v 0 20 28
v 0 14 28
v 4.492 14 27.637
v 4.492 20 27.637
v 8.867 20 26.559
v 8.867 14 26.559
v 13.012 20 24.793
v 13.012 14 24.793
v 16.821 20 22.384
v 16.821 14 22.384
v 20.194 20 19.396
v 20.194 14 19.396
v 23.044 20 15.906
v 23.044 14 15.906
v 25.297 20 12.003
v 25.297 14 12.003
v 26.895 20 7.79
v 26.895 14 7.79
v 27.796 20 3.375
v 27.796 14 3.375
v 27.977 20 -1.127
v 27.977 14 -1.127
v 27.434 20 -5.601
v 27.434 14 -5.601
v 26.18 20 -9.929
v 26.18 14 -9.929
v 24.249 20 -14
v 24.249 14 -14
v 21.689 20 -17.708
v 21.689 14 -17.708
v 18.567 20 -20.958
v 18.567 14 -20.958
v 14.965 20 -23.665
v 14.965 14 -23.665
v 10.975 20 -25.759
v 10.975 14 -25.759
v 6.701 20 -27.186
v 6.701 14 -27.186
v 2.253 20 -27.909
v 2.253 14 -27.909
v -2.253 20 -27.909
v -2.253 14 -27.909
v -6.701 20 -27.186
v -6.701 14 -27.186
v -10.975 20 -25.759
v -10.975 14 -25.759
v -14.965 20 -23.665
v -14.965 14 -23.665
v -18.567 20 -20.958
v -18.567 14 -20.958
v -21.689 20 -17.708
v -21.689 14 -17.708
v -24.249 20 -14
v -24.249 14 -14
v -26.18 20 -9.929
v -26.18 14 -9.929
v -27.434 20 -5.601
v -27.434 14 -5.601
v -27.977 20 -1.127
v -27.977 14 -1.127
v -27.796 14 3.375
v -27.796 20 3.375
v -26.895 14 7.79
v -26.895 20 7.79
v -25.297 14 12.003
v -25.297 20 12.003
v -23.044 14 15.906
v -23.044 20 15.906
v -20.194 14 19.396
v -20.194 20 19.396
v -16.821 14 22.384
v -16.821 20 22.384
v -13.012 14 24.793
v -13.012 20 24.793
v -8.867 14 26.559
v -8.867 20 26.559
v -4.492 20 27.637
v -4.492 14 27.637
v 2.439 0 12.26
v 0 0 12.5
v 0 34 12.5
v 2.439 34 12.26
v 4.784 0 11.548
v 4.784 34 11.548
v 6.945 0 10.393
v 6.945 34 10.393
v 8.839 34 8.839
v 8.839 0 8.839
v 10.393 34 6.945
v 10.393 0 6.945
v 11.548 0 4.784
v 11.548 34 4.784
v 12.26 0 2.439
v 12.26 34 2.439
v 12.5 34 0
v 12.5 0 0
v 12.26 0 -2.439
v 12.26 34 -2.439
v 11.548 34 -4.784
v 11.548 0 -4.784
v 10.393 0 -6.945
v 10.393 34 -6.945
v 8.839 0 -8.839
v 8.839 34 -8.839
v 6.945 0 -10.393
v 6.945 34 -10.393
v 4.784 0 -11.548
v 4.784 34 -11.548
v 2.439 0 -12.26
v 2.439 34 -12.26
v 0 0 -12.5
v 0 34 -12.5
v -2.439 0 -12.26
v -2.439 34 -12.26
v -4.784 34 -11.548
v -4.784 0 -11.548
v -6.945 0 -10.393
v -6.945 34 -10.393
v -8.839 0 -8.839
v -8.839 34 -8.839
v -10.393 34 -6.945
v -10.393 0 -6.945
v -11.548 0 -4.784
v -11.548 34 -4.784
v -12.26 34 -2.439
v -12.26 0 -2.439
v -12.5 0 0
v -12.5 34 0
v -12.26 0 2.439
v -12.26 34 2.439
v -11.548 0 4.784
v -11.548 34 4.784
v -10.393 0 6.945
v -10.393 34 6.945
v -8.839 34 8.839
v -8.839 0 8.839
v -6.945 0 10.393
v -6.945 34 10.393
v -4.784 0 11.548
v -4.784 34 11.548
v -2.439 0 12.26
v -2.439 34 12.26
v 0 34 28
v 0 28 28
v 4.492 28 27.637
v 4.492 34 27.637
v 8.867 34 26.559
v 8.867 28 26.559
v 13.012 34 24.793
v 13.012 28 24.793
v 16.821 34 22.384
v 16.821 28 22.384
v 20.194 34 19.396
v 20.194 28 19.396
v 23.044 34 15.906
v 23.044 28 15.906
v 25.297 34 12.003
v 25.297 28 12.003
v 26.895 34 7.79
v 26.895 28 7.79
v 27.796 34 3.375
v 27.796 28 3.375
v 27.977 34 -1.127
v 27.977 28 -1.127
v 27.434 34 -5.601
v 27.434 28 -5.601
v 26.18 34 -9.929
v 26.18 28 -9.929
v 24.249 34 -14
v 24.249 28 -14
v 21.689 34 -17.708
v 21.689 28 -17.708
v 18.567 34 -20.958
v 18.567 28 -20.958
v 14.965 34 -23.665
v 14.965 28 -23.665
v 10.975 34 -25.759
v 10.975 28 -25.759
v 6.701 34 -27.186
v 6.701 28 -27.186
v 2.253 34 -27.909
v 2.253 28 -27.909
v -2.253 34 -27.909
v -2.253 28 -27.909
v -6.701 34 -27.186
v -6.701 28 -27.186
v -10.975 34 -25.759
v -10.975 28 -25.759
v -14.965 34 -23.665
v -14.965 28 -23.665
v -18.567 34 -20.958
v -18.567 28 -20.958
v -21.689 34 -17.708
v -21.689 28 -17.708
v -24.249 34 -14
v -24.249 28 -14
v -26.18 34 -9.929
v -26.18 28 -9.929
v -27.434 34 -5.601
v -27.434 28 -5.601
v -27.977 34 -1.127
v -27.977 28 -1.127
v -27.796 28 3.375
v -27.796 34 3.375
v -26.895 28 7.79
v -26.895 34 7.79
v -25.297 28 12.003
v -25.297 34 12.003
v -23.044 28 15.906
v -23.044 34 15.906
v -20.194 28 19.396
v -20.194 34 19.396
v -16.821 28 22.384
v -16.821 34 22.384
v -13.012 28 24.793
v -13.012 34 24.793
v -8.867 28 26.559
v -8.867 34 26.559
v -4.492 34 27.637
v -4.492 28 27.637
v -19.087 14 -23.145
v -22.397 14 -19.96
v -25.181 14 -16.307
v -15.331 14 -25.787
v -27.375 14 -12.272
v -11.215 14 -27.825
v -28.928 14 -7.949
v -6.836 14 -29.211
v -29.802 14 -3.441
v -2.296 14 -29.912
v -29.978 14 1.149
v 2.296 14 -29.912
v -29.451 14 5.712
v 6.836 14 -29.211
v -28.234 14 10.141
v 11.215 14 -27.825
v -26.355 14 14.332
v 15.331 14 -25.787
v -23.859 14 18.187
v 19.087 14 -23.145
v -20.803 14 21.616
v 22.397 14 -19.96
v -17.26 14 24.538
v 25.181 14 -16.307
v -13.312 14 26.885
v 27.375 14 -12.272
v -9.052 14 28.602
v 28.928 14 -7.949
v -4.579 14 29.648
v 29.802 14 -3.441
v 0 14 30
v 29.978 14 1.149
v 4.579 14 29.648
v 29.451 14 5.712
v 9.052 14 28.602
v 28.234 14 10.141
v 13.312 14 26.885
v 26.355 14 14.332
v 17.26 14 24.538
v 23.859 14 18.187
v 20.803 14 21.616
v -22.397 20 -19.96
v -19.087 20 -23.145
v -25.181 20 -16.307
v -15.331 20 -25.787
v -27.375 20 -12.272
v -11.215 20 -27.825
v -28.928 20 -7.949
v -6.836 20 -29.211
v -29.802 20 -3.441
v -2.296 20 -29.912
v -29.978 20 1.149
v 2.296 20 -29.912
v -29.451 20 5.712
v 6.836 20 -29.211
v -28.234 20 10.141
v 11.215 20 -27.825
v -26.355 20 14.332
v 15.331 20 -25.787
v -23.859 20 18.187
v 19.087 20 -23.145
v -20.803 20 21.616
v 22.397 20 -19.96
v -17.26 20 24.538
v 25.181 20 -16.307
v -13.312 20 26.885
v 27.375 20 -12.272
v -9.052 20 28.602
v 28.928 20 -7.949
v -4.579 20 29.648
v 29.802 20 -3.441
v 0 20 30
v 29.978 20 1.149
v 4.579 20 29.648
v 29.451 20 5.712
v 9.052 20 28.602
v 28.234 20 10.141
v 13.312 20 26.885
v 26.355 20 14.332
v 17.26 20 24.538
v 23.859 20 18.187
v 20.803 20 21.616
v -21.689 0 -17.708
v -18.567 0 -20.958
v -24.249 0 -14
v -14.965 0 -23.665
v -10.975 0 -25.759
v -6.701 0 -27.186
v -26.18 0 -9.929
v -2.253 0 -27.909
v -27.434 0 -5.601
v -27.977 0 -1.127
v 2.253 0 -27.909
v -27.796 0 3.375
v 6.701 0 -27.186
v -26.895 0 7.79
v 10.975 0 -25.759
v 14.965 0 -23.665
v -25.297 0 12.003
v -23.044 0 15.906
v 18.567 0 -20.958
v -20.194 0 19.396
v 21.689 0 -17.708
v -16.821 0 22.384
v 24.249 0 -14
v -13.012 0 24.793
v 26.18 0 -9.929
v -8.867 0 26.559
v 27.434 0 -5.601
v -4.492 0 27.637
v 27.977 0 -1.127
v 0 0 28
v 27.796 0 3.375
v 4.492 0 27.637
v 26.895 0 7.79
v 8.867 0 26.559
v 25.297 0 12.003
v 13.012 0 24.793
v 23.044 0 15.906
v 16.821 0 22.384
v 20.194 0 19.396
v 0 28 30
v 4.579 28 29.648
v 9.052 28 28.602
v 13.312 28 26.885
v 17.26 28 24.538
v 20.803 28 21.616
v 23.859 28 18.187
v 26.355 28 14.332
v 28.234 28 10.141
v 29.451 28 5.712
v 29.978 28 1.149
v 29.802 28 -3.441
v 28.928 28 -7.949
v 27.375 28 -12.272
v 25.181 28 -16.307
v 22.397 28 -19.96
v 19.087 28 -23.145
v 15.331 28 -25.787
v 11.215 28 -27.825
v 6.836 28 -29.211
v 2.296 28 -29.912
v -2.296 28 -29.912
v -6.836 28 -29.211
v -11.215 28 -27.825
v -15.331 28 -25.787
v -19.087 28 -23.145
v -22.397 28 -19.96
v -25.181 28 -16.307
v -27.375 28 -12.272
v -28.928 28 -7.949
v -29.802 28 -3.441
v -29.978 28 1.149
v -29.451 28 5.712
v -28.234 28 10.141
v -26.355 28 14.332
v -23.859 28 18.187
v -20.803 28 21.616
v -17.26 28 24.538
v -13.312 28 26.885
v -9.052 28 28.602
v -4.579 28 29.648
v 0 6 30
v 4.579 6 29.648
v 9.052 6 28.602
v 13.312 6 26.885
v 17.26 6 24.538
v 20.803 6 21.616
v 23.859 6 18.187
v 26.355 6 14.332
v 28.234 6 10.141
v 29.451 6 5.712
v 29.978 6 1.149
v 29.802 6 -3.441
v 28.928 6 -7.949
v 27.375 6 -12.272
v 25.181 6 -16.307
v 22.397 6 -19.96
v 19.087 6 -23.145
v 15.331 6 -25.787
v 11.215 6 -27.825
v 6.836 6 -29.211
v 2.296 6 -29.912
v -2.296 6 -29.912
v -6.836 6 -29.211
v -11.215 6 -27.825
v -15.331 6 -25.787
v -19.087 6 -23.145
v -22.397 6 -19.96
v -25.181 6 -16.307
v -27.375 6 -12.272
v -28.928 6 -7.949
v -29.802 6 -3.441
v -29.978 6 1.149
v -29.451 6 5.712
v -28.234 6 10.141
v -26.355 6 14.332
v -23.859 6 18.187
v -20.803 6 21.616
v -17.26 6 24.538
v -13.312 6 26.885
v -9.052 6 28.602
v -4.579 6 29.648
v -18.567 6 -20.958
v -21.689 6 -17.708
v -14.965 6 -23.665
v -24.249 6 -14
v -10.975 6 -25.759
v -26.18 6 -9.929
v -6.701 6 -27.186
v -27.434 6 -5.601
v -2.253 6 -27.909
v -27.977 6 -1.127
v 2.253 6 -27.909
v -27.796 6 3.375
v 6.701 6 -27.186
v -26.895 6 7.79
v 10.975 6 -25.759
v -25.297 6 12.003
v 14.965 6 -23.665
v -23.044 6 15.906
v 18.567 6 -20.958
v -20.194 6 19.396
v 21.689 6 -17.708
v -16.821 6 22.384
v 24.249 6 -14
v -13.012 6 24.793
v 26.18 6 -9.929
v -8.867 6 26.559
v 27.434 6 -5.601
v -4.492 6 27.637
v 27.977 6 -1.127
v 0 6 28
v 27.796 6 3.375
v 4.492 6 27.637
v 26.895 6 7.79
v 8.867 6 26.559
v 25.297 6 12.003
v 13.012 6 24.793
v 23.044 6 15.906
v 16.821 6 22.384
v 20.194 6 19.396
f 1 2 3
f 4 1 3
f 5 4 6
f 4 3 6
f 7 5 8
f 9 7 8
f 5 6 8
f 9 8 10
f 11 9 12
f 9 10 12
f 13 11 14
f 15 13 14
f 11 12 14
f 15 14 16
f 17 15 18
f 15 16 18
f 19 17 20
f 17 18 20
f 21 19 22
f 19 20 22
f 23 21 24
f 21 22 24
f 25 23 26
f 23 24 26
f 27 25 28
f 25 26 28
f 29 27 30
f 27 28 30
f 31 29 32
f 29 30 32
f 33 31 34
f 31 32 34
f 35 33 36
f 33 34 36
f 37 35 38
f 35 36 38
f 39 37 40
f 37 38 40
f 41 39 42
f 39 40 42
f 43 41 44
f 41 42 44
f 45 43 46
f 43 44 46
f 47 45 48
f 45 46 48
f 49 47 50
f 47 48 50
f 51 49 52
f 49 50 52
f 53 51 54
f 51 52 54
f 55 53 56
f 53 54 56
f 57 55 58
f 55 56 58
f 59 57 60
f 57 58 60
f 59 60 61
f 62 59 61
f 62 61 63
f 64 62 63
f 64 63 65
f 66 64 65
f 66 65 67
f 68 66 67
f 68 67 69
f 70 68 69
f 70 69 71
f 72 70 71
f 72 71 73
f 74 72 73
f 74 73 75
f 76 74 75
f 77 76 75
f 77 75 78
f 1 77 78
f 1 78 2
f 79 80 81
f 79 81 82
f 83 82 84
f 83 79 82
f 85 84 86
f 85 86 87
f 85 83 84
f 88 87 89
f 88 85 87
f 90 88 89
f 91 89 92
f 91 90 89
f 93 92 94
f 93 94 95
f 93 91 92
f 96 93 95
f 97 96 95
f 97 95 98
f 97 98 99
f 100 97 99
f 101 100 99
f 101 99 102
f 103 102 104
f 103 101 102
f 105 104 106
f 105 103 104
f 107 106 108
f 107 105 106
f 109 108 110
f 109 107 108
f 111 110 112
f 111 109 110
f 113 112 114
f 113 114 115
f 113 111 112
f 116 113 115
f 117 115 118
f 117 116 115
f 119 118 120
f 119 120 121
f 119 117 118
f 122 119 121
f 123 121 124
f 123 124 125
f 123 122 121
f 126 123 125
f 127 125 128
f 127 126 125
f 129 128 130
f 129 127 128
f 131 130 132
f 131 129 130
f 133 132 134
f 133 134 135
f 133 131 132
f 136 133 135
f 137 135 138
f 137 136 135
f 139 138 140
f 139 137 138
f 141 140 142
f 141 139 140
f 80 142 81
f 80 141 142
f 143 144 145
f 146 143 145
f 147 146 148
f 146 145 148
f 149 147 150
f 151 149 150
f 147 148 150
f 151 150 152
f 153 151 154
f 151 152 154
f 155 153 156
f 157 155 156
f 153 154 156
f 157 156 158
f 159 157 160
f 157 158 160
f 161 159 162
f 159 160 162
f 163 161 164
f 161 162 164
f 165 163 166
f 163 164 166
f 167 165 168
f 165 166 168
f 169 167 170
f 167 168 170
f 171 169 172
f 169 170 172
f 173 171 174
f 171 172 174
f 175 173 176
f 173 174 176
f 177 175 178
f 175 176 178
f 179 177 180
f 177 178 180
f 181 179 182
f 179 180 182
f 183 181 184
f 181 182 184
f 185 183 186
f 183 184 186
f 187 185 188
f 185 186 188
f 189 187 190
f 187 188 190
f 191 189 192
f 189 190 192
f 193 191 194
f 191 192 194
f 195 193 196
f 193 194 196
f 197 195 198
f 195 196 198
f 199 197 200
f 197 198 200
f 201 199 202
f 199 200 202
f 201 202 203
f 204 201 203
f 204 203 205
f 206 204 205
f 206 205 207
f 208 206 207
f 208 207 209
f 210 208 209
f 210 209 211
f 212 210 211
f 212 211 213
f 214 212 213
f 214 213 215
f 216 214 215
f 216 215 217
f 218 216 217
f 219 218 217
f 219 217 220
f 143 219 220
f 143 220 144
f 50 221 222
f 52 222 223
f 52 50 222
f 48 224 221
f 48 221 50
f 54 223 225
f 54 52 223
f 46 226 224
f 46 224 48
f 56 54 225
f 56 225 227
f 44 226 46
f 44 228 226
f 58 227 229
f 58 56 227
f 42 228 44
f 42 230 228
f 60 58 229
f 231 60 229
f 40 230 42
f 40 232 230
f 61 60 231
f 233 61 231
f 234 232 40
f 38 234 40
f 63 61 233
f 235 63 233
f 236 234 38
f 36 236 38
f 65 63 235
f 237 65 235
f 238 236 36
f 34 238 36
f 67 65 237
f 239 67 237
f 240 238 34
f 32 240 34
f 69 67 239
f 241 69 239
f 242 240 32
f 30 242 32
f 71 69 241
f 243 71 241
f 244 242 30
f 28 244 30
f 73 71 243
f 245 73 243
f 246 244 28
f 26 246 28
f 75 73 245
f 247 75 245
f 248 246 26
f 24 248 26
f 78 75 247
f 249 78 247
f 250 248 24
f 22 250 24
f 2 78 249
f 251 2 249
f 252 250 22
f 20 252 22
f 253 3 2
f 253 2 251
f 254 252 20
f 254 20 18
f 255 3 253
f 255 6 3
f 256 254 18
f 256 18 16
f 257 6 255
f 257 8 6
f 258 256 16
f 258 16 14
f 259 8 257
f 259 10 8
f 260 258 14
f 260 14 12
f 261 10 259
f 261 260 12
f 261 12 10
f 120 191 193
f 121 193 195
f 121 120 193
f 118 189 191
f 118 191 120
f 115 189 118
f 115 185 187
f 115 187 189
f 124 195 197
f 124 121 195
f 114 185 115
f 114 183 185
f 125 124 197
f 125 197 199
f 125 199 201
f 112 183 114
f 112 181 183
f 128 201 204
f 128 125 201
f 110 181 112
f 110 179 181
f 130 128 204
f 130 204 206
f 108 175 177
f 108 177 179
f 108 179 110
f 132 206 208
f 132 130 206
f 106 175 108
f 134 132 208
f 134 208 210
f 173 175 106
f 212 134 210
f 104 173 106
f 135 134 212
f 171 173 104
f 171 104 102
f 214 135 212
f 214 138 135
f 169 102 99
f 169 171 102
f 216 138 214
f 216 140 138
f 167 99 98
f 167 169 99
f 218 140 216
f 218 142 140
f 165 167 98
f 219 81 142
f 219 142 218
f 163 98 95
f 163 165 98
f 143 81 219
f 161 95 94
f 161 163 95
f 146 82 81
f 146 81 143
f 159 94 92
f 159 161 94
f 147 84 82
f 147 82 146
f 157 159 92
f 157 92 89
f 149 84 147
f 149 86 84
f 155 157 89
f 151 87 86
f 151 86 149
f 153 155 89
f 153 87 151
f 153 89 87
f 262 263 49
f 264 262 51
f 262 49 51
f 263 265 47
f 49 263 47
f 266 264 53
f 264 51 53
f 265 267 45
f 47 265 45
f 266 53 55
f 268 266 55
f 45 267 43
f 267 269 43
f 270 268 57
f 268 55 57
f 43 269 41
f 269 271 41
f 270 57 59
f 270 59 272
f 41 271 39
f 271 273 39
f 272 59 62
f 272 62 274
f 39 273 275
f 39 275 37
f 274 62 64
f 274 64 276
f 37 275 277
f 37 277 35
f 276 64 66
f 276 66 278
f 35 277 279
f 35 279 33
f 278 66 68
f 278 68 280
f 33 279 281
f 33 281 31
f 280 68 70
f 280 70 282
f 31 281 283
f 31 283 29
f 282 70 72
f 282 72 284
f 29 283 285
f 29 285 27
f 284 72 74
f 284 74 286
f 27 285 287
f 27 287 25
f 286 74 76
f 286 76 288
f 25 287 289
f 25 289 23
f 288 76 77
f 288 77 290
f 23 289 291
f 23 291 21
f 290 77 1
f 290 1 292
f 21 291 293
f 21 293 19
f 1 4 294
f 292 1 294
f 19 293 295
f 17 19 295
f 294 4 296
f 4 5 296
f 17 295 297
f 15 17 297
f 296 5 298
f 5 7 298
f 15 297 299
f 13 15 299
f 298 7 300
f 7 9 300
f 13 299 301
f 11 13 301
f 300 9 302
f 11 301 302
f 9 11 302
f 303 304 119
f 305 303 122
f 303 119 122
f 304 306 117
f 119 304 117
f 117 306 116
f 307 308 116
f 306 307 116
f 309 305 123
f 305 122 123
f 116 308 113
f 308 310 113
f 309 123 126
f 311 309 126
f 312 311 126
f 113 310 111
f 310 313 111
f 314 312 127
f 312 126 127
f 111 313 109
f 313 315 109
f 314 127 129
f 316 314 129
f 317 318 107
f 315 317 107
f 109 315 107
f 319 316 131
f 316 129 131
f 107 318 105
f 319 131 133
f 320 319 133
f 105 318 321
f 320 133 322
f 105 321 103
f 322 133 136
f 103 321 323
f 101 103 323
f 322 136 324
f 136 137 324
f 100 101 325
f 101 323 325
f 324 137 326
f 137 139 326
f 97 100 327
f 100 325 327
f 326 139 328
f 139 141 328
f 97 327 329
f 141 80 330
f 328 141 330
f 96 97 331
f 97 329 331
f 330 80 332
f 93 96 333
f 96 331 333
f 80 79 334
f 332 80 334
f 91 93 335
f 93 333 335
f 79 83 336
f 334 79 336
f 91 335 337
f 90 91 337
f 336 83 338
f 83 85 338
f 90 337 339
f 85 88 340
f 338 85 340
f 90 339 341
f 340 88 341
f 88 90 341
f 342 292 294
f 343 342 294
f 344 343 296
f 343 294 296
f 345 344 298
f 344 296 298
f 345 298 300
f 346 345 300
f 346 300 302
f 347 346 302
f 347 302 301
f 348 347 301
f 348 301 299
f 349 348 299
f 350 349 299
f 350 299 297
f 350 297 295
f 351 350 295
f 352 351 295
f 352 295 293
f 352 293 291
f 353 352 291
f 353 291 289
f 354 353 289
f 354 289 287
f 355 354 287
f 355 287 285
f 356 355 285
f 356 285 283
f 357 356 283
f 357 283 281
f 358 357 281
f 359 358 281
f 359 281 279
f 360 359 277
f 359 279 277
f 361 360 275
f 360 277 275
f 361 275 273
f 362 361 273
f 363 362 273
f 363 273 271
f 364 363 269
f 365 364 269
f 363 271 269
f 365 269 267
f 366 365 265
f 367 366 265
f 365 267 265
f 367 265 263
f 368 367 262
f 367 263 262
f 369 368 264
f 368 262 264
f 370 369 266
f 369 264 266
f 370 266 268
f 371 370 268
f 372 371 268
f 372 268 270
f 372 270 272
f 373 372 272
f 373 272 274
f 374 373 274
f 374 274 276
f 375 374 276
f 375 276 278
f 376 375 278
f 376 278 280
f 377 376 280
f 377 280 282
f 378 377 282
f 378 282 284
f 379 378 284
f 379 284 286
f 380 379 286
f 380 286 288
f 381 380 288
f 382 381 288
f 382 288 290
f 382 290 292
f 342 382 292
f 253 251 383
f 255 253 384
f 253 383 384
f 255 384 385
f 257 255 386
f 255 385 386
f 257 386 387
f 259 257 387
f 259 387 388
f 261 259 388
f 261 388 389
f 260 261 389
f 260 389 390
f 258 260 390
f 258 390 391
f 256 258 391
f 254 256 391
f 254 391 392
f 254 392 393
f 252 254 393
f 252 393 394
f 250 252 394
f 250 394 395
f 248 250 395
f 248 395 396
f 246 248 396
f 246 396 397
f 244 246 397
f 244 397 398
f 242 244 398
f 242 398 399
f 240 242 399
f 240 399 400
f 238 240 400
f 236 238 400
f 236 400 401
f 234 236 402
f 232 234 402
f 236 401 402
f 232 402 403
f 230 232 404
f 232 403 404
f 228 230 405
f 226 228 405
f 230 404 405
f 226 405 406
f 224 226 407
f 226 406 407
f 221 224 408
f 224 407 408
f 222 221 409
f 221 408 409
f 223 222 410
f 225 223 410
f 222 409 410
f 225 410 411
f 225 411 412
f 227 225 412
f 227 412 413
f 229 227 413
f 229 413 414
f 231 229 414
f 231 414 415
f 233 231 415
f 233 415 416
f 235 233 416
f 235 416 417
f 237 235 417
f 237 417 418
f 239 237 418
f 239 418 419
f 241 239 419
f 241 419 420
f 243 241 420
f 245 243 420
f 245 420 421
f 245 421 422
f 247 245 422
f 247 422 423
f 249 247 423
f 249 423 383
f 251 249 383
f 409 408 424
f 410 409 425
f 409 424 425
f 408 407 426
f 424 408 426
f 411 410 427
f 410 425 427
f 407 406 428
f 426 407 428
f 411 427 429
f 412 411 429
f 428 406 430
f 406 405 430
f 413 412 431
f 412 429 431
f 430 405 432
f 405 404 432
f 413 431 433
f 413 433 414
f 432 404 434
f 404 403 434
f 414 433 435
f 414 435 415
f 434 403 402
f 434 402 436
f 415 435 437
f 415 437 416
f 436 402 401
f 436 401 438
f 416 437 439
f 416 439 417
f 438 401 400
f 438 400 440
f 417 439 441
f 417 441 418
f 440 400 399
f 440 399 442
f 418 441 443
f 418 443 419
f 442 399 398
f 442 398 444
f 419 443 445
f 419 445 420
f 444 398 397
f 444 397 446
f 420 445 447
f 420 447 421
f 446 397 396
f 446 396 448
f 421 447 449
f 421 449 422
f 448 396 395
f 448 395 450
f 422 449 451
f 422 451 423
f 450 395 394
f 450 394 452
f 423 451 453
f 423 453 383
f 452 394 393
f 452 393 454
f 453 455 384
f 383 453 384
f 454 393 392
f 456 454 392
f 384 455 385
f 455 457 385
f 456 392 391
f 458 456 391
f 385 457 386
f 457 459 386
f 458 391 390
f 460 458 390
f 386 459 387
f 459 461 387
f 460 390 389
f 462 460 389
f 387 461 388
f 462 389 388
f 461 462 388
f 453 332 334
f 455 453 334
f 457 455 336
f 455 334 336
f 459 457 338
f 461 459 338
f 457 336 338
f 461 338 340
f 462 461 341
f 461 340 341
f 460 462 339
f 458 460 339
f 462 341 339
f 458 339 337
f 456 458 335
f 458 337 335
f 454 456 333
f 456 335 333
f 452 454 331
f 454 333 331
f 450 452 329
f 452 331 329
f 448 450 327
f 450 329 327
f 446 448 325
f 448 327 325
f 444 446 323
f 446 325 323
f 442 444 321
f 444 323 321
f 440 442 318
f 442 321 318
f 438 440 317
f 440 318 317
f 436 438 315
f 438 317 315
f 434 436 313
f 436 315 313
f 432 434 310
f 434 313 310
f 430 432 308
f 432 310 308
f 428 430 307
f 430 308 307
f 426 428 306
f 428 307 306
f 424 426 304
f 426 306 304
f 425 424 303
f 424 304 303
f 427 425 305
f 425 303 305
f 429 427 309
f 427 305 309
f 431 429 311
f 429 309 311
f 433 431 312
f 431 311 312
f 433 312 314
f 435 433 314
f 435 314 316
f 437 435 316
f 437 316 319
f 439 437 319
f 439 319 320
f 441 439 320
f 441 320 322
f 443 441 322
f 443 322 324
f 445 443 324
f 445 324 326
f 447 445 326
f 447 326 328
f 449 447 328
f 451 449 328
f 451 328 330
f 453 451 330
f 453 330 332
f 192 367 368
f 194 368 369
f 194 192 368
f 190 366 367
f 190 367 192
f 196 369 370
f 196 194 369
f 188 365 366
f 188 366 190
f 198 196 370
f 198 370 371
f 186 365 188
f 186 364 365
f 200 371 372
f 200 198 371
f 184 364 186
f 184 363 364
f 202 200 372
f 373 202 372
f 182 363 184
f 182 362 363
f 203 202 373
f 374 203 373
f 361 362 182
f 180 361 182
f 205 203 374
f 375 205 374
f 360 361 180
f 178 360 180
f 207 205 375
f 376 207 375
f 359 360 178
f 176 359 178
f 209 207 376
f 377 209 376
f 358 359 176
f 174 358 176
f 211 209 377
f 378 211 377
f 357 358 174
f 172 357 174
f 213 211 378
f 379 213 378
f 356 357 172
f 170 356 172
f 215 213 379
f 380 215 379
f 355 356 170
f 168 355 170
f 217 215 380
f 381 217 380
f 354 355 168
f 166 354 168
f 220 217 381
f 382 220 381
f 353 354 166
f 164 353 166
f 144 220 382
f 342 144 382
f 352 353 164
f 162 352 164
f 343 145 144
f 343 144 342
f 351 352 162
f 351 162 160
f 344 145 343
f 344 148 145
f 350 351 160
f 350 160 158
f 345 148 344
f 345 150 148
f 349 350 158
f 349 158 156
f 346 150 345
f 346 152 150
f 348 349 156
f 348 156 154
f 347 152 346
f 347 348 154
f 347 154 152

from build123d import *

# Parameters (mm, degrees)
SKETCH_1_R             = 30
SKETCH_1_R_2           = 12.5
EXTRUDE_1_DEPTH        = 34
CUT_EXTRUDE_START      = -6
SKETCH_2_R             = 30
SKETCH_2_R_2           = 28
CUT_EXTRUDE_1_DEPTH    = 6
PATTERN_LINEAR_1_COUNT = 3
PATTERN_LINEAR_1_PITCH = 14


with BuildPart() as part:
    # 草图1 → 凸台-拉伸1 (new body)
    with BuildSketch(Plane(origin=(0, 0, 0), x_dir=(1, 0, 0), z_dir=(0, 1, 0))):
        with Locations(Location((0, 0, 0), (0, 0, 270))):
            Circle(SKETCH_1_R)
        with Locations(Location((0, 0, 0), (0, 0, 270))):
            Circle(SKETCH_1_R_2, mode=Mode.SUBTRACT)
    extrude(amount=EXTRUDE_1_DEPTH)

    # 草图2 → 切除-拉伸1 (cut)
    with BuildSketch(Plane(origin=(0, 34, 0), x_dir=(1, 0, 0), z_dir=(0, 1, 0)).offset(CUT_EXTRUDE_START)):
        with Locations(Location((0, 0, 0), (0, 0, 270))):
            Circle(SKETCH_2_R)
        with Locations(Location((0, 0, 0), (0, 0, 270))):
            Circle(SKETCH_2_R_2, mode=Mode.SUBTRACT)
    cut_extrude_1 = extrude(amount=CUT_EXTRUDE_1_DEPTH, mode=Mode.SUBTRACT)

    # 阵列(线性)1: 切除-拉伸1 ×3
    with Locations(*[(0, -i * PATTERN_LINEAR_1_PITCH, 0) for i in range(1, PATTERN_LINEAR_1_COUNT)]):
        add(cut_extrude_1, mode=Mode.SUBTRACT)


solid = part.part
